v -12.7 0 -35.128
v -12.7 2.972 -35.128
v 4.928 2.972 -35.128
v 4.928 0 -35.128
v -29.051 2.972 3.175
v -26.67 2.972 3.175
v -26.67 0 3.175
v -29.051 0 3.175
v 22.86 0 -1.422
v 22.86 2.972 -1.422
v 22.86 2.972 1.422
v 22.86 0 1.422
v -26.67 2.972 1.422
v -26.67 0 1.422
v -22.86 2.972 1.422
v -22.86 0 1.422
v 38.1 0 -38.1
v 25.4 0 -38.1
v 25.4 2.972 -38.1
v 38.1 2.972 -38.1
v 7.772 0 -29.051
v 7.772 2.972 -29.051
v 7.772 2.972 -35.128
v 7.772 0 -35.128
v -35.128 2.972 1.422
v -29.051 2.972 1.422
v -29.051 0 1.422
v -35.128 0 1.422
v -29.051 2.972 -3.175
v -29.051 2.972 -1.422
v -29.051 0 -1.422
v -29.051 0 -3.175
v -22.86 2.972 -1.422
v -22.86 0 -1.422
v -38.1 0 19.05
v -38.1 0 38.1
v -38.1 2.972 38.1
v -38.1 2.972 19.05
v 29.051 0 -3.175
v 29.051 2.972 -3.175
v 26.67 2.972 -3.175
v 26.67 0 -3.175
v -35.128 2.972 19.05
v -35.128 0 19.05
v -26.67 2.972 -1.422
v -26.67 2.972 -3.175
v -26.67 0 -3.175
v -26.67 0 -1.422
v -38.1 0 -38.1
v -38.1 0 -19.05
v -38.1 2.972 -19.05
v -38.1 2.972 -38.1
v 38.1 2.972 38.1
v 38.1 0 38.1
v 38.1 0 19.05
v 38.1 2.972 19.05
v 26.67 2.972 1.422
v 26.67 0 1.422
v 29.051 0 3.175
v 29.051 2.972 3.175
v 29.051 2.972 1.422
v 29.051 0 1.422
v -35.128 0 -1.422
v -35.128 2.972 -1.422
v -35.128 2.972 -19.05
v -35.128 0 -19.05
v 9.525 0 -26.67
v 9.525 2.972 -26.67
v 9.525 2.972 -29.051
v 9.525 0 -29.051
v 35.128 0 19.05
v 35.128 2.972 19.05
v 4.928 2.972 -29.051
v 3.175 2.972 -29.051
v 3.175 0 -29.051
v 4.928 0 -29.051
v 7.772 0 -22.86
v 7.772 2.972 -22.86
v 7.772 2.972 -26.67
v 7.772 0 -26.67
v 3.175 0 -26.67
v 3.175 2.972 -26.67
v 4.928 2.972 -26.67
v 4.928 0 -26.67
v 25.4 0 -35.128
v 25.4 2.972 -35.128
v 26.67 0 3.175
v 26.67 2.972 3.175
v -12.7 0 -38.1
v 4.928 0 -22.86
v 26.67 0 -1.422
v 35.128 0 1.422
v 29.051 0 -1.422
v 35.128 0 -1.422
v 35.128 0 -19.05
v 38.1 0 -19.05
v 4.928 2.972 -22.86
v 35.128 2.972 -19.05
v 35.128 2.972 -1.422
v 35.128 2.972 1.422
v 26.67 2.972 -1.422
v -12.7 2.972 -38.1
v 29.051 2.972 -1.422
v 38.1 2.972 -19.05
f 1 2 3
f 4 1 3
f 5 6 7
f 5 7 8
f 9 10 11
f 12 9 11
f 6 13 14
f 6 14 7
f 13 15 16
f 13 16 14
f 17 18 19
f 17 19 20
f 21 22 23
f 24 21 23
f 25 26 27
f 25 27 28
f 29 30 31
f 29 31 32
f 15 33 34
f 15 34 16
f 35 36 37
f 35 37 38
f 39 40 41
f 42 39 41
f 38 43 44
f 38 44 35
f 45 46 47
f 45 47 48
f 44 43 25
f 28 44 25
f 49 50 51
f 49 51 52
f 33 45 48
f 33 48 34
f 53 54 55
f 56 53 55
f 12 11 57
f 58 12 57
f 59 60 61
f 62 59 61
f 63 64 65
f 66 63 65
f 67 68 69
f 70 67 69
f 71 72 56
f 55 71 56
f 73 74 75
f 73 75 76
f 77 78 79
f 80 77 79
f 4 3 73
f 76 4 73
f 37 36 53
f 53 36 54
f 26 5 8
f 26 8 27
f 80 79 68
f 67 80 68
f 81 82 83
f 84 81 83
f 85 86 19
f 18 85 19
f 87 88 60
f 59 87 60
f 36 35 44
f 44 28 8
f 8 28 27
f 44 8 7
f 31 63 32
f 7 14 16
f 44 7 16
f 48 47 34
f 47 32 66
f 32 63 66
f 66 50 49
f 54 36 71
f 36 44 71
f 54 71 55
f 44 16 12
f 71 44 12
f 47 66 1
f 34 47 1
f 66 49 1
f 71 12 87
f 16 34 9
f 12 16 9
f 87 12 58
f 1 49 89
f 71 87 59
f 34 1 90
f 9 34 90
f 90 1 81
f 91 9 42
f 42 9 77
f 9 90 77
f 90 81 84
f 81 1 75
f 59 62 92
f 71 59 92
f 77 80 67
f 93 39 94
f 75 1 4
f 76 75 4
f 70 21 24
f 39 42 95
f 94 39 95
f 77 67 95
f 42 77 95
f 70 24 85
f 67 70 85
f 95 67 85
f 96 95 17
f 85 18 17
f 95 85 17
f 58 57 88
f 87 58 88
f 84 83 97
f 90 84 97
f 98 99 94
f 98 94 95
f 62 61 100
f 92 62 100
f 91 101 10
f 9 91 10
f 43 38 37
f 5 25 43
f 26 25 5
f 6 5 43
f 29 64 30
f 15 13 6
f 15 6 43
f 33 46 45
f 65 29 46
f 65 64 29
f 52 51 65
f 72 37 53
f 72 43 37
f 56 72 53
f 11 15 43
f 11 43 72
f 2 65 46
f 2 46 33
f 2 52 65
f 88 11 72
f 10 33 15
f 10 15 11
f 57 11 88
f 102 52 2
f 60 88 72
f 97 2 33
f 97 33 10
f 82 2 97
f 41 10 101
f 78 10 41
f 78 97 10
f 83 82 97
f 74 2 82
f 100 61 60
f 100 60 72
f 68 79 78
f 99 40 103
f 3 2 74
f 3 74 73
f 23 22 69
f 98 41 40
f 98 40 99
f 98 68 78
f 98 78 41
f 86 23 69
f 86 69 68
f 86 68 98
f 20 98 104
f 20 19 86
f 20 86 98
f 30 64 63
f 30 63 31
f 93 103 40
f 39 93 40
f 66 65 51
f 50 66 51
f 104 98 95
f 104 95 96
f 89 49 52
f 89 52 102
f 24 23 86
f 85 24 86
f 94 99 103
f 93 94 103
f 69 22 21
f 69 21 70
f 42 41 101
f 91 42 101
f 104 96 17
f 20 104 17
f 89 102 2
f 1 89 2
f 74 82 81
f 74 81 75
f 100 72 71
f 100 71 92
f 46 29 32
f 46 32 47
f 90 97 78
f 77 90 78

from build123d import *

# Parameters (mm, degrees)
SKETCH1_W           = 76.2
SKETCH1_H           = 76.2
BOSS_EXTRUDE1_DEPTH = 2.9718
SKETCH2_W           = 2.9718
SKETCH2_H           = 38.1
CUT_EXTRUDE1_DEPTH  = 54.963428313
CUT_EXTRUDE7_DEPTH  = 54.963428313
SKETCH8_W           = 1.7526
SKETCH8_H           = 2.38125
CUT_EXTRUDE8_DEPTH  = 54.963428313


with BuildPart() as part:
    # Sketch1 → Boss-Extrude1 (new body)
    with BuildSketch(Plane(origin=(0, 0, 0), x_dir=(1, 0, 0), z_dir=(0, 1, 0))):
        Rectangle(SKETCH1_W, SKETCH1_H)
    extrude(amount=BOSS_EXTRUDE1_DEPTH)

    # Sketch2 → Cut-Extrude1 (cut, through all)
    with BuildSketch(Plane(origin=(0, 2.9718, 0), x_dir=(1, 0, 0), z_dir=(0, 1, 0))):
        with Locations((36.6141, 0)):
            Rectangle(SKETCH2_W, SKETCH2_H)
    cut_extrude1 = extrude(amount=-CUT_EXTRUDE1_DEPTH, mode=Mode.SUBTRACT)

    # Sketch7 → Cut-Extrude7 (cut, through all)
    with BuildSketch(Plane(origin=(0, 2.9718, 0), x_dir=(1, 0, 0), z_dir=(0, 1, 0))):
        Polygon((35.1282, 1.4224), (29.05125, 1.4224), (29.05125, 3.175), (26.67, 3.175), (26.67, 1.4224), (22.86, 1.4224), (22.86, -1.4224), (26.67, -1.4224), (26.67, -3.175), (29.05125, -3.175), (29.05125, -1.4224), (35.1282, -1.4224), align=None)
    cut_extrude7 = extrude(amount=-CUT_EXTRUDE7_DEPTH, mode=Mode.SUBTRACT)

    # Sketch8 → Cut-Extrude8 (cut, through all)
    with BuildSketch(Plane(origin=(0, 2.9718, 0), x_dir=(1, 0, 0), z_dir=(0, 1, 0))):
        Polygon((25.4, 38.1), (-12.7, 38.1), (-12.7, 35.1282), (4.9276, 35.1282), (7.7724, 35.1282), (25.4, 35.1282), align=None)
        Polygon((7.7724, 35.1282), (4.9276, 35.1282), (4.9276, 29.05125), (4.9276, 26.67), (4.9276, 22.86), (7.7724, 22.86), (7.7724, 26.67), (7.7724, 29.05125), align=None)
        with Locations((8.6487, 27.860625)):
            Rectangle(SKETCH8_W, SKETCH8_H)
        with Locations((4.0513, 27.860625)):
            Rectangle(SKETCH8_W, SKETCH8_H)
    extrude(amount=-CUT_EXTRUDE8_DEPTH, mode=Mode.SUBTRACT)

    # Mirror1: Cut-Extrude1, Cut-Extrude7 across plane
    add(cut_extrude1.mirror(Plane(origin=(0, 0, 0), x_dir=(0, 0, 1), z_dir=(1, 0, 0))), mode=Mode.SUBTRACT)
    add(cut_extrude7.mirror(Plane(origin=(0, 0, 0), x_dir=(0, 0, 1), z_dir=(1, 0, 0))), mode=Mode.SUBTRACT)


solid = part.part
